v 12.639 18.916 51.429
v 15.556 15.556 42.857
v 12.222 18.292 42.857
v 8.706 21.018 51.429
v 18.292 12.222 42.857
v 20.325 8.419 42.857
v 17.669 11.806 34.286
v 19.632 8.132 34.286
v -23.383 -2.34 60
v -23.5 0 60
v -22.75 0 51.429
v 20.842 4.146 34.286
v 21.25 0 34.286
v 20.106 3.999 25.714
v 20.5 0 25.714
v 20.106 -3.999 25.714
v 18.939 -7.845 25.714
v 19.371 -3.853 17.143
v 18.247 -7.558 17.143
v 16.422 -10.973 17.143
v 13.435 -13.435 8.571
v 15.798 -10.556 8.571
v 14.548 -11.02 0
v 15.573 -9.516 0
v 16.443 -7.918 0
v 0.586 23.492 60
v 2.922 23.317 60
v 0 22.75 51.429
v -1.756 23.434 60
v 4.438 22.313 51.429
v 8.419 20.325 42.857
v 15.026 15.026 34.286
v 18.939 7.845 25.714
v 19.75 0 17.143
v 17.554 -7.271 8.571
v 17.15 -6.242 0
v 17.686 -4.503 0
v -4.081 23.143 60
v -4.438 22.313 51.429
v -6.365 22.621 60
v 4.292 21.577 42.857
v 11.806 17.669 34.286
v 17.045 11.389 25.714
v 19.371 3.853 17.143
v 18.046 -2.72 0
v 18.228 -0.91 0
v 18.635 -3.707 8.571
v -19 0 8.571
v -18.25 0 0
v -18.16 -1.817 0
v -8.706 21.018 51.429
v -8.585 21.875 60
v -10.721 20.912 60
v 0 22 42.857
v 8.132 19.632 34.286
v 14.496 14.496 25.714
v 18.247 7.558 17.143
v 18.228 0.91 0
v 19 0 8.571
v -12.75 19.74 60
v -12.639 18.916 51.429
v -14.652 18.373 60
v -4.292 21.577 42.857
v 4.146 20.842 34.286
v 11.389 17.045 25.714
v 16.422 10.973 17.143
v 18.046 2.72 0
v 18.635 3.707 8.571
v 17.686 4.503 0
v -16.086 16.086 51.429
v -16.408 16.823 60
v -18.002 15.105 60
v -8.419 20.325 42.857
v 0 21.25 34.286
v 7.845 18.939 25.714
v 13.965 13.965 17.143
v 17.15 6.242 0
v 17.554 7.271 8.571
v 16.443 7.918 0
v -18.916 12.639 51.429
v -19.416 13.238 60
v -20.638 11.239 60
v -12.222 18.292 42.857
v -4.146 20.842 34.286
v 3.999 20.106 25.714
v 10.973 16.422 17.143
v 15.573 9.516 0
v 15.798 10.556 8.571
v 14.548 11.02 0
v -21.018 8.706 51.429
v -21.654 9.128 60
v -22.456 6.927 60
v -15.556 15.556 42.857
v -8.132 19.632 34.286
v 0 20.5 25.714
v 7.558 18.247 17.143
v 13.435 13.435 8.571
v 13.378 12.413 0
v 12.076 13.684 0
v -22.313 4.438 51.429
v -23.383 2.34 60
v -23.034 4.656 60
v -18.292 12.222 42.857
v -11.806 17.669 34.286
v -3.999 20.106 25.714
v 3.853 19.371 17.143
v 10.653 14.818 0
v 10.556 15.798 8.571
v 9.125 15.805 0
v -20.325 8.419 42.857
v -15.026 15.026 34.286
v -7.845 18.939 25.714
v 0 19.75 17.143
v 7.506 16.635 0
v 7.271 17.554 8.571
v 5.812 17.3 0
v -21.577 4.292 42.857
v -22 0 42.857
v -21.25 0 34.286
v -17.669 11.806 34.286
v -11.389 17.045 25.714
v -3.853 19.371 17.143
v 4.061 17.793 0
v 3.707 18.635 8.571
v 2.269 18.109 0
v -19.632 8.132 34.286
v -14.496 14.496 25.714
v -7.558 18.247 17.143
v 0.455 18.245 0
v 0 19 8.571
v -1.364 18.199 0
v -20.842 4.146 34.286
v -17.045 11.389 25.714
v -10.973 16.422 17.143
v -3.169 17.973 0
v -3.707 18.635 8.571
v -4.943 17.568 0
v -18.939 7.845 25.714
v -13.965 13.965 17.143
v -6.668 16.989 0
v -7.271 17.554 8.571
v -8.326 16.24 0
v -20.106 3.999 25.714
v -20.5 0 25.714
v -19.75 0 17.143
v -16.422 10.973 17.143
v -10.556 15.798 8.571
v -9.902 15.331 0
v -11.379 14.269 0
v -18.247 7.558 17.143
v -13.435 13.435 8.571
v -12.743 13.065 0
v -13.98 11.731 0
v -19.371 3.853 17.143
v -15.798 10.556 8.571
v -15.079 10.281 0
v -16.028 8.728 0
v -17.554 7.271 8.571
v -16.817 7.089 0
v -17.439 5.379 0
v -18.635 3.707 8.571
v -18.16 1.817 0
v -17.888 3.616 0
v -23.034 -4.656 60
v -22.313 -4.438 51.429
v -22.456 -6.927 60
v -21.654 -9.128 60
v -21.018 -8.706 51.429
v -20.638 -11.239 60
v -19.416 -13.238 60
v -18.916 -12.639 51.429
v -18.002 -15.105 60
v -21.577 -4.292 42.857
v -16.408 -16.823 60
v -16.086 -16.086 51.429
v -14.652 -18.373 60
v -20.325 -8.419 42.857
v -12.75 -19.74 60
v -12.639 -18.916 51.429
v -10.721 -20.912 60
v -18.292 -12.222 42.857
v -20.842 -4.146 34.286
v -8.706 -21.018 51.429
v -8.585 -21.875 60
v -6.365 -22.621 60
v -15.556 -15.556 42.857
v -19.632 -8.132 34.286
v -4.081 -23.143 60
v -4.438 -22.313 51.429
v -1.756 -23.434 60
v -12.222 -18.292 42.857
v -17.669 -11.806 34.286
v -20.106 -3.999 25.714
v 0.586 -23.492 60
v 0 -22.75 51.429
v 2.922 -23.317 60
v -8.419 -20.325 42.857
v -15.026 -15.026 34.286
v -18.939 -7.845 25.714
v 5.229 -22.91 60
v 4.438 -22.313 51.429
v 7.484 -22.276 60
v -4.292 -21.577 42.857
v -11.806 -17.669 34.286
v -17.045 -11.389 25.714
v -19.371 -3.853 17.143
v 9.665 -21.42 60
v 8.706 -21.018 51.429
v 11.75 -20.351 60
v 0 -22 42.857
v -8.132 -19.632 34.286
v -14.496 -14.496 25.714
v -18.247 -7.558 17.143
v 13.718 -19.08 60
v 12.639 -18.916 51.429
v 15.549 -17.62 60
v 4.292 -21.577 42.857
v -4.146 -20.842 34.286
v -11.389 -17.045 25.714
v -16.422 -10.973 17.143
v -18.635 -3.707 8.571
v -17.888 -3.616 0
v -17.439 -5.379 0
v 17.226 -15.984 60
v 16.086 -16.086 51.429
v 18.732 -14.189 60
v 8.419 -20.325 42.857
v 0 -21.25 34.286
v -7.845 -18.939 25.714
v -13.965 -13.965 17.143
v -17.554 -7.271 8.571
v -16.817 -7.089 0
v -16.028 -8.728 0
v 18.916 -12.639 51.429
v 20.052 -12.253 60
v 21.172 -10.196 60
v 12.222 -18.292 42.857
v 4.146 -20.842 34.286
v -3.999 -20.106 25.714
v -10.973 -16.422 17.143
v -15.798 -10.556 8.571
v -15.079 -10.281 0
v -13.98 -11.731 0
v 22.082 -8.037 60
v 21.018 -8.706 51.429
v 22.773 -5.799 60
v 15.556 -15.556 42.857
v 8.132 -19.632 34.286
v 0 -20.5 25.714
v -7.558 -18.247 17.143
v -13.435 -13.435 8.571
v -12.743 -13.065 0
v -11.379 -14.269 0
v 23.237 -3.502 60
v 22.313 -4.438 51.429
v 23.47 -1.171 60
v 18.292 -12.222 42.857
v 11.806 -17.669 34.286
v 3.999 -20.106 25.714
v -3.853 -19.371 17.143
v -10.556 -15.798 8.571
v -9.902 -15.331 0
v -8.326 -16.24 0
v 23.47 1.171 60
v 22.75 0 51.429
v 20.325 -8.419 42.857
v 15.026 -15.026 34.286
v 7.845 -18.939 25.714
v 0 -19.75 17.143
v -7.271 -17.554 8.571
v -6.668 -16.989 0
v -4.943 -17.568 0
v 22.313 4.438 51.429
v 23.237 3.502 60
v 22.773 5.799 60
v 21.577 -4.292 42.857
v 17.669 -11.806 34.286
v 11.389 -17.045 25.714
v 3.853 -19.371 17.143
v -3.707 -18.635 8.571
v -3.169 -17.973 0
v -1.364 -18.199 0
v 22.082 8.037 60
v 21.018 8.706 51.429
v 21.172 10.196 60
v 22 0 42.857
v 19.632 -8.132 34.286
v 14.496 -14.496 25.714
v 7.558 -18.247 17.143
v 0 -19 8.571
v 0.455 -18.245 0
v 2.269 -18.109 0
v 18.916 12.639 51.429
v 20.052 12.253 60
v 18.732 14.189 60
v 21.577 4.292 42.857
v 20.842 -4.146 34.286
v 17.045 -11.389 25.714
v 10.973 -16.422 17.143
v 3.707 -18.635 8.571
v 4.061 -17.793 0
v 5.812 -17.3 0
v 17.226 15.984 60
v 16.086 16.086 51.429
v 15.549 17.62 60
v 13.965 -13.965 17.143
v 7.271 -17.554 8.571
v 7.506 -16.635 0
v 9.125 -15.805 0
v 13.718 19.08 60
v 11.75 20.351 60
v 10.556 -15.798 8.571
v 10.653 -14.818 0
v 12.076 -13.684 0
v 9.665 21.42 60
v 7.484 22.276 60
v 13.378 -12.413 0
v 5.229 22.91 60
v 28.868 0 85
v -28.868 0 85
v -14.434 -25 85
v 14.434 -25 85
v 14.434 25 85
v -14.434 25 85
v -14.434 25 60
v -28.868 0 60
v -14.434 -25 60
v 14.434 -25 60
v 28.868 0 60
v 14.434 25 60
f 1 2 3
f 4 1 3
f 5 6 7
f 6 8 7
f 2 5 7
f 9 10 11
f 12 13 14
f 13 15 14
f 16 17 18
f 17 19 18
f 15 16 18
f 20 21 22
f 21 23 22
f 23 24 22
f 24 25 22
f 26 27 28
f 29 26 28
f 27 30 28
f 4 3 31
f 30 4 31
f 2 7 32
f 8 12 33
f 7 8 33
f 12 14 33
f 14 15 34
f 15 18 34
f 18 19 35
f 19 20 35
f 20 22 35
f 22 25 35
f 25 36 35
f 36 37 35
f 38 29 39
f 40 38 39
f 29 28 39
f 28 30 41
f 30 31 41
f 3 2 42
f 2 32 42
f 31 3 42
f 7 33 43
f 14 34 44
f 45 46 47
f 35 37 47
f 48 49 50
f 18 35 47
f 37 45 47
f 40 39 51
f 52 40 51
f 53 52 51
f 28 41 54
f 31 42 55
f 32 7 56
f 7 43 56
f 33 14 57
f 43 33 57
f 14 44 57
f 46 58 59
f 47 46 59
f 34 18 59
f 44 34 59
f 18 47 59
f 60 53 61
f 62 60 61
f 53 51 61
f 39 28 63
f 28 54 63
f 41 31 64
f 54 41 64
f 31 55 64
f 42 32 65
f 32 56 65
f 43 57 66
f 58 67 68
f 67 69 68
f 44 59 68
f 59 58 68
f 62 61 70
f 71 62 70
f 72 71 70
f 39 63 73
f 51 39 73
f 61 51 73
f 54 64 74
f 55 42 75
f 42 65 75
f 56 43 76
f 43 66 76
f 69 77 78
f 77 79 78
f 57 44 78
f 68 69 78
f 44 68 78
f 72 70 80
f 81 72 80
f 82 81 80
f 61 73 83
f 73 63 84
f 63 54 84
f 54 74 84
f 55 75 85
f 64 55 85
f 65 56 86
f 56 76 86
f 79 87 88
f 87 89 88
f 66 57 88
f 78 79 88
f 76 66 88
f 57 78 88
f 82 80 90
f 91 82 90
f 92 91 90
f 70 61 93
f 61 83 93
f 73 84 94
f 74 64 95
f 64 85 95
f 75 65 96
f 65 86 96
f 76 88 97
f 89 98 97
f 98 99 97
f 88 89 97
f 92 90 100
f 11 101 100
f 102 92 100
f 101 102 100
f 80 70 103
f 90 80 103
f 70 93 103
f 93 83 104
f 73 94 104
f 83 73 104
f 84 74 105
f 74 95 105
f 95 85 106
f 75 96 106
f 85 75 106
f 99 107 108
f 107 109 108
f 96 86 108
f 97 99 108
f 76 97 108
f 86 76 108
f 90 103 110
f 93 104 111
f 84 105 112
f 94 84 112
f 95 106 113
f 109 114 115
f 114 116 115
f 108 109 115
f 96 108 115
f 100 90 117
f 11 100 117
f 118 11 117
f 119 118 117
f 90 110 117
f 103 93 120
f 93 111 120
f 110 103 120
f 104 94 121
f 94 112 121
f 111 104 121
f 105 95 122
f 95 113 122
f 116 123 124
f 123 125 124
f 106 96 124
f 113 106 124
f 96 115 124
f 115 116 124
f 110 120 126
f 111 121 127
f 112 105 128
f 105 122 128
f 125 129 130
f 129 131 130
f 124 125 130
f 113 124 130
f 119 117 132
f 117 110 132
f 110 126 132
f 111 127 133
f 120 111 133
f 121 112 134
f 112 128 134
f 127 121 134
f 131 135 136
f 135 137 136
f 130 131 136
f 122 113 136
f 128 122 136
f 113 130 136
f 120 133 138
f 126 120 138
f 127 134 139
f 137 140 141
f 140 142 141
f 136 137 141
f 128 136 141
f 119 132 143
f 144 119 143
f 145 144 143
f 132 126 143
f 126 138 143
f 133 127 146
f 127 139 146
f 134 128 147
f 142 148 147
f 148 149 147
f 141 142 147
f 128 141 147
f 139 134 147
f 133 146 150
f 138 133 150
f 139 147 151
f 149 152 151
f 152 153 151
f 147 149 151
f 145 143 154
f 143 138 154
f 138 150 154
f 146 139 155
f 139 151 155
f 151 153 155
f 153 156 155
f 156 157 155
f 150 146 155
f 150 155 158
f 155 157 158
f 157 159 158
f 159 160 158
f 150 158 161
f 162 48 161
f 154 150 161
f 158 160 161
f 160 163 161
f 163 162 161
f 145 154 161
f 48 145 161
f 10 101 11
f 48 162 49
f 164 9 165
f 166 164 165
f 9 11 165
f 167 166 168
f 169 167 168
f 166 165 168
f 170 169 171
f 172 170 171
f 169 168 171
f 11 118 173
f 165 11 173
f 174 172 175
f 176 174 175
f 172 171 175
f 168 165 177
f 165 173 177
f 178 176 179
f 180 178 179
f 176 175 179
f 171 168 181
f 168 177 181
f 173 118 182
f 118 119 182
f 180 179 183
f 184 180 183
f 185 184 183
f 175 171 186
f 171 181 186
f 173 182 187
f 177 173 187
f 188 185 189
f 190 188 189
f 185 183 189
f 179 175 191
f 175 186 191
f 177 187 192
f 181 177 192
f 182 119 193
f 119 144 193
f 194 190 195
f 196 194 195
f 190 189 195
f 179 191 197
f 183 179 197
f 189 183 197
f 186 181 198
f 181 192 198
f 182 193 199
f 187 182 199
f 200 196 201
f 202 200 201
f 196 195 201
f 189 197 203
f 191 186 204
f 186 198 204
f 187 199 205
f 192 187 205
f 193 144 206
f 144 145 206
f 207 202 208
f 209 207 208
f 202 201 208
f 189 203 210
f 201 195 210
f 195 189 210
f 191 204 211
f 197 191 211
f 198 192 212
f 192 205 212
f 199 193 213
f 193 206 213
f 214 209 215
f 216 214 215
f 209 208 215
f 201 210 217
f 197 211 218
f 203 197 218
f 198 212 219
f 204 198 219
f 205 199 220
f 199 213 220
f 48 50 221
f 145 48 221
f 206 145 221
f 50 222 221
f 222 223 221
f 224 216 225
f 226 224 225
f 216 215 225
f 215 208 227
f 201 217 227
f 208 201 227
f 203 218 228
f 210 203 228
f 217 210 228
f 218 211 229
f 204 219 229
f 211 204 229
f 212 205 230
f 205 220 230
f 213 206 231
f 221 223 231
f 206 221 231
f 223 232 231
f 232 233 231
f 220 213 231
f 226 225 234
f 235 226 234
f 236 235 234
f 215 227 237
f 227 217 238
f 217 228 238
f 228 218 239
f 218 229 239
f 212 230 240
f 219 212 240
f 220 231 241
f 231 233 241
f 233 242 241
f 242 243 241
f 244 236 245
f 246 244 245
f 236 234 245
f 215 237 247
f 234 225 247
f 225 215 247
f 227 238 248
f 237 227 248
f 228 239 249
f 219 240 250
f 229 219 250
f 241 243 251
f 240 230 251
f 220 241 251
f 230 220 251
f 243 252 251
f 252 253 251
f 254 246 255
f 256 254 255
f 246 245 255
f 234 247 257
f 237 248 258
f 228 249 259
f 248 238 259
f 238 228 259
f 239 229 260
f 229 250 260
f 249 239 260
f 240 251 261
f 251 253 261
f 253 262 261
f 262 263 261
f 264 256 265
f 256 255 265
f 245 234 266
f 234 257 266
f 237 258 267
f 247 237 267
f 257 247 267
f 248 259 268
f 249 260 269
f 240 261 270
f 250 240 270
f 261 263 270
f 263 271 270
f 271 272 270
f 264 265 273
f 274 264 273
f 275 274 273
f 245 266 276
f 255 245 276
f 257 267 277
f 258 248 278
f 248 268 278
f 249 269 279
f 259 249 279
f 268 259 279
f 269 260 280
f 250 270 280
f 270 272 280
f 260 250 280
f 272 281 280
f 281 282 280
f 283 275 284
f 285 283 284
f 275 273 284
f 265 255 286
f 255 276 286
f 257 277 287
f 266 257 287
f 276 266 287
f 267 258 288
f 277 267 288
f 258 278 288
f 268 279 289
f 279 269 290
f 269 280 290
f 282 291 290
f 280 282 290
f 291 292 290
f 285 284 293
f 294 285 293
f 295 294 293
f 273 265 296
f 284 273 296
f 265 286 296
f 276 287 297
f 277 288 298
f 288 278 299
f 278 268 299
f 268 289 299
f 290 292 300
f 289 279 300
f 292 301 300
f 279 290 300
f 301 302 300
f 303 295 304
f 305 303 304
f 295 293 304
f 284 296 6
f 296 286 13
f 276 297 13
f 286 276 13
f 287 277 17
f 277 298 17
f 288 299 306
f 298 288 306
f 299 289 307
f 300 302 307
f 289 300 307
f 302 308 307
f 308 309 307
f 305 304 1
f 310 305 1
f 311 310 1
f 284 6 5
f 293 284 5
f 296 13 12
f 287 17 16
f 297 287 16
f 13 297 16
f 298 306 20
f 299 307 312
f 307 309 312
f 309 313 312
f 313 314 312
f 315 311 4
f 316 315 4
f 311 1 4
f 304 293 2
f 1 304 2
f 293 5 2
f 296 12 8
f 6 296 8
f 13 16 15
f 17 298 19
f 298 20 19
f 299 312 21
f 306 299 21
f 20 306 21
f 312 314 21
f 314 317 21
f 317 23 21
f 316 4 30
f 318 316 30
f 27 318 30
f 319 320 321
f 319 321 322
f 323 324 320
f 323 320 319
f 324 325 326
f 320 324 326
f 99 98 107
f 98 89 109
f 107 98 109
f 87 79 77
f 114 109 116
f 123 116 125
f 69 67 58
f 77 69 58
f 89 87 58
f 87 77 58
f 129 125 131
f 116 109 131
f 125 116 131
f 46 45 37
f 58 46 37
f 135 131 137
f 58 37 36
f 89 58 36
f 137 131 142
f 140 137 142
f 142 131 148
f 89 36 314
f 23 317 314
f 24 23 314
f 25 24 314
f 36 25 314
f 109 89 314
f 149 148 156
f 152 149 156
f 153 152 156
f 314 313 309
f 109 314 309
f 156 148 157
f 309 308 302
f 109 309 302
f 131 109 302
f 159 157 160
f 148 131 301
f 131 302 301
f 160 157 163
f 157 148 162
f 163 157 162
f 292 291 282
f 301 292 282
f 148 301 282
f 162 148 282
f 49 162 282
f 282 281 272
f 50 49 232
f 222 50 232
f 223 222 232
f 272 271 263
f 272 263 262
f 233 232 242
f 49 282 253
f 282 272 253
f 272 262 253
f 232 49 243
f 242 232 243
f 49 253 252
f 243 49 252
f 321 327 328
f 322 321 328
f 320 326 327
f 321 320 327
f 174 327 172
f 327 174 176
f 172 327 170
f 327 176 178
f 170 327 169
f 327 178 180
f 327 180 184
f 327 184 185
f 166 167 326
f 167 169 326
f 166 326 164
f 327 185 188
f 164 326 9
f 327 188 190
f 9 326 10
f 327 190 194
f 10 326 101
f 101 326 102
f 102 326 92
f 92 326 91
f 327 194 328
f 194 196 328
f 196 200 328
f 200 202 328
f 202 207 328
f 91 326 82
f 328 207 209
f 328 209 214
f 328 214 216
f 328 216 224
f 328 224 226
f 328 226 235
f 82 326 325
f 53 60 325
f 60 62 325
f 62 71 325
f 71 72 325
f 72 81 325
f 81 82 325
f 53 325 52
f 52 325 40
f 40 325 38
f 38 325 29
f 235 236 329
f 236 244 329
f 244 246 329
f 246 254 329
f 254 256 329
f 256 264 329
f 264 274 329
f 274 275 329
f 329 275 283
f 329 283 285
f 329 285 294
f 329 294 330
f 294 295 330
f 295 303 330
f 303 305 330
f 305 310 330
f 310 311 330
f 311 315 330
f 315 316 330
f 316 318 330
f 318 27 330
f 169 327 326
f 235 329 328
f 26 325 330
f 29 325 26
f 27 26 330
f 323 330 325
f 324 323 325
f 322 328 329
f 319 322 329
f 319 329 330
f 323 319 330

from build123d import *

# Parameters (mm, degrees)
F3_DEPTH = 25


with BuildPart() as f1:
    # F0 (on Front) → F1 (revolve)
    with BuildSketch(Plane.XZ):
        Polygon((-18.250227, 0), (0, 0), (0, 60), (-23.499547, 60), align=None)
    revolve(axis=Axis((0, 0, 72.624769), (0, 0, 1)))

    # F2 (on face) → F3 (join)
    with BuildSketch(Plane.XY.offset(60)):
        Polygon((-14.433757, 25), (-28.867513, 0), (-14.433757, -25), (14.433757, -25), (28.867513, 0), (14.433757, 25), align=None)
    extrude(amount=F3_DEPTH)


solid = f1.part
